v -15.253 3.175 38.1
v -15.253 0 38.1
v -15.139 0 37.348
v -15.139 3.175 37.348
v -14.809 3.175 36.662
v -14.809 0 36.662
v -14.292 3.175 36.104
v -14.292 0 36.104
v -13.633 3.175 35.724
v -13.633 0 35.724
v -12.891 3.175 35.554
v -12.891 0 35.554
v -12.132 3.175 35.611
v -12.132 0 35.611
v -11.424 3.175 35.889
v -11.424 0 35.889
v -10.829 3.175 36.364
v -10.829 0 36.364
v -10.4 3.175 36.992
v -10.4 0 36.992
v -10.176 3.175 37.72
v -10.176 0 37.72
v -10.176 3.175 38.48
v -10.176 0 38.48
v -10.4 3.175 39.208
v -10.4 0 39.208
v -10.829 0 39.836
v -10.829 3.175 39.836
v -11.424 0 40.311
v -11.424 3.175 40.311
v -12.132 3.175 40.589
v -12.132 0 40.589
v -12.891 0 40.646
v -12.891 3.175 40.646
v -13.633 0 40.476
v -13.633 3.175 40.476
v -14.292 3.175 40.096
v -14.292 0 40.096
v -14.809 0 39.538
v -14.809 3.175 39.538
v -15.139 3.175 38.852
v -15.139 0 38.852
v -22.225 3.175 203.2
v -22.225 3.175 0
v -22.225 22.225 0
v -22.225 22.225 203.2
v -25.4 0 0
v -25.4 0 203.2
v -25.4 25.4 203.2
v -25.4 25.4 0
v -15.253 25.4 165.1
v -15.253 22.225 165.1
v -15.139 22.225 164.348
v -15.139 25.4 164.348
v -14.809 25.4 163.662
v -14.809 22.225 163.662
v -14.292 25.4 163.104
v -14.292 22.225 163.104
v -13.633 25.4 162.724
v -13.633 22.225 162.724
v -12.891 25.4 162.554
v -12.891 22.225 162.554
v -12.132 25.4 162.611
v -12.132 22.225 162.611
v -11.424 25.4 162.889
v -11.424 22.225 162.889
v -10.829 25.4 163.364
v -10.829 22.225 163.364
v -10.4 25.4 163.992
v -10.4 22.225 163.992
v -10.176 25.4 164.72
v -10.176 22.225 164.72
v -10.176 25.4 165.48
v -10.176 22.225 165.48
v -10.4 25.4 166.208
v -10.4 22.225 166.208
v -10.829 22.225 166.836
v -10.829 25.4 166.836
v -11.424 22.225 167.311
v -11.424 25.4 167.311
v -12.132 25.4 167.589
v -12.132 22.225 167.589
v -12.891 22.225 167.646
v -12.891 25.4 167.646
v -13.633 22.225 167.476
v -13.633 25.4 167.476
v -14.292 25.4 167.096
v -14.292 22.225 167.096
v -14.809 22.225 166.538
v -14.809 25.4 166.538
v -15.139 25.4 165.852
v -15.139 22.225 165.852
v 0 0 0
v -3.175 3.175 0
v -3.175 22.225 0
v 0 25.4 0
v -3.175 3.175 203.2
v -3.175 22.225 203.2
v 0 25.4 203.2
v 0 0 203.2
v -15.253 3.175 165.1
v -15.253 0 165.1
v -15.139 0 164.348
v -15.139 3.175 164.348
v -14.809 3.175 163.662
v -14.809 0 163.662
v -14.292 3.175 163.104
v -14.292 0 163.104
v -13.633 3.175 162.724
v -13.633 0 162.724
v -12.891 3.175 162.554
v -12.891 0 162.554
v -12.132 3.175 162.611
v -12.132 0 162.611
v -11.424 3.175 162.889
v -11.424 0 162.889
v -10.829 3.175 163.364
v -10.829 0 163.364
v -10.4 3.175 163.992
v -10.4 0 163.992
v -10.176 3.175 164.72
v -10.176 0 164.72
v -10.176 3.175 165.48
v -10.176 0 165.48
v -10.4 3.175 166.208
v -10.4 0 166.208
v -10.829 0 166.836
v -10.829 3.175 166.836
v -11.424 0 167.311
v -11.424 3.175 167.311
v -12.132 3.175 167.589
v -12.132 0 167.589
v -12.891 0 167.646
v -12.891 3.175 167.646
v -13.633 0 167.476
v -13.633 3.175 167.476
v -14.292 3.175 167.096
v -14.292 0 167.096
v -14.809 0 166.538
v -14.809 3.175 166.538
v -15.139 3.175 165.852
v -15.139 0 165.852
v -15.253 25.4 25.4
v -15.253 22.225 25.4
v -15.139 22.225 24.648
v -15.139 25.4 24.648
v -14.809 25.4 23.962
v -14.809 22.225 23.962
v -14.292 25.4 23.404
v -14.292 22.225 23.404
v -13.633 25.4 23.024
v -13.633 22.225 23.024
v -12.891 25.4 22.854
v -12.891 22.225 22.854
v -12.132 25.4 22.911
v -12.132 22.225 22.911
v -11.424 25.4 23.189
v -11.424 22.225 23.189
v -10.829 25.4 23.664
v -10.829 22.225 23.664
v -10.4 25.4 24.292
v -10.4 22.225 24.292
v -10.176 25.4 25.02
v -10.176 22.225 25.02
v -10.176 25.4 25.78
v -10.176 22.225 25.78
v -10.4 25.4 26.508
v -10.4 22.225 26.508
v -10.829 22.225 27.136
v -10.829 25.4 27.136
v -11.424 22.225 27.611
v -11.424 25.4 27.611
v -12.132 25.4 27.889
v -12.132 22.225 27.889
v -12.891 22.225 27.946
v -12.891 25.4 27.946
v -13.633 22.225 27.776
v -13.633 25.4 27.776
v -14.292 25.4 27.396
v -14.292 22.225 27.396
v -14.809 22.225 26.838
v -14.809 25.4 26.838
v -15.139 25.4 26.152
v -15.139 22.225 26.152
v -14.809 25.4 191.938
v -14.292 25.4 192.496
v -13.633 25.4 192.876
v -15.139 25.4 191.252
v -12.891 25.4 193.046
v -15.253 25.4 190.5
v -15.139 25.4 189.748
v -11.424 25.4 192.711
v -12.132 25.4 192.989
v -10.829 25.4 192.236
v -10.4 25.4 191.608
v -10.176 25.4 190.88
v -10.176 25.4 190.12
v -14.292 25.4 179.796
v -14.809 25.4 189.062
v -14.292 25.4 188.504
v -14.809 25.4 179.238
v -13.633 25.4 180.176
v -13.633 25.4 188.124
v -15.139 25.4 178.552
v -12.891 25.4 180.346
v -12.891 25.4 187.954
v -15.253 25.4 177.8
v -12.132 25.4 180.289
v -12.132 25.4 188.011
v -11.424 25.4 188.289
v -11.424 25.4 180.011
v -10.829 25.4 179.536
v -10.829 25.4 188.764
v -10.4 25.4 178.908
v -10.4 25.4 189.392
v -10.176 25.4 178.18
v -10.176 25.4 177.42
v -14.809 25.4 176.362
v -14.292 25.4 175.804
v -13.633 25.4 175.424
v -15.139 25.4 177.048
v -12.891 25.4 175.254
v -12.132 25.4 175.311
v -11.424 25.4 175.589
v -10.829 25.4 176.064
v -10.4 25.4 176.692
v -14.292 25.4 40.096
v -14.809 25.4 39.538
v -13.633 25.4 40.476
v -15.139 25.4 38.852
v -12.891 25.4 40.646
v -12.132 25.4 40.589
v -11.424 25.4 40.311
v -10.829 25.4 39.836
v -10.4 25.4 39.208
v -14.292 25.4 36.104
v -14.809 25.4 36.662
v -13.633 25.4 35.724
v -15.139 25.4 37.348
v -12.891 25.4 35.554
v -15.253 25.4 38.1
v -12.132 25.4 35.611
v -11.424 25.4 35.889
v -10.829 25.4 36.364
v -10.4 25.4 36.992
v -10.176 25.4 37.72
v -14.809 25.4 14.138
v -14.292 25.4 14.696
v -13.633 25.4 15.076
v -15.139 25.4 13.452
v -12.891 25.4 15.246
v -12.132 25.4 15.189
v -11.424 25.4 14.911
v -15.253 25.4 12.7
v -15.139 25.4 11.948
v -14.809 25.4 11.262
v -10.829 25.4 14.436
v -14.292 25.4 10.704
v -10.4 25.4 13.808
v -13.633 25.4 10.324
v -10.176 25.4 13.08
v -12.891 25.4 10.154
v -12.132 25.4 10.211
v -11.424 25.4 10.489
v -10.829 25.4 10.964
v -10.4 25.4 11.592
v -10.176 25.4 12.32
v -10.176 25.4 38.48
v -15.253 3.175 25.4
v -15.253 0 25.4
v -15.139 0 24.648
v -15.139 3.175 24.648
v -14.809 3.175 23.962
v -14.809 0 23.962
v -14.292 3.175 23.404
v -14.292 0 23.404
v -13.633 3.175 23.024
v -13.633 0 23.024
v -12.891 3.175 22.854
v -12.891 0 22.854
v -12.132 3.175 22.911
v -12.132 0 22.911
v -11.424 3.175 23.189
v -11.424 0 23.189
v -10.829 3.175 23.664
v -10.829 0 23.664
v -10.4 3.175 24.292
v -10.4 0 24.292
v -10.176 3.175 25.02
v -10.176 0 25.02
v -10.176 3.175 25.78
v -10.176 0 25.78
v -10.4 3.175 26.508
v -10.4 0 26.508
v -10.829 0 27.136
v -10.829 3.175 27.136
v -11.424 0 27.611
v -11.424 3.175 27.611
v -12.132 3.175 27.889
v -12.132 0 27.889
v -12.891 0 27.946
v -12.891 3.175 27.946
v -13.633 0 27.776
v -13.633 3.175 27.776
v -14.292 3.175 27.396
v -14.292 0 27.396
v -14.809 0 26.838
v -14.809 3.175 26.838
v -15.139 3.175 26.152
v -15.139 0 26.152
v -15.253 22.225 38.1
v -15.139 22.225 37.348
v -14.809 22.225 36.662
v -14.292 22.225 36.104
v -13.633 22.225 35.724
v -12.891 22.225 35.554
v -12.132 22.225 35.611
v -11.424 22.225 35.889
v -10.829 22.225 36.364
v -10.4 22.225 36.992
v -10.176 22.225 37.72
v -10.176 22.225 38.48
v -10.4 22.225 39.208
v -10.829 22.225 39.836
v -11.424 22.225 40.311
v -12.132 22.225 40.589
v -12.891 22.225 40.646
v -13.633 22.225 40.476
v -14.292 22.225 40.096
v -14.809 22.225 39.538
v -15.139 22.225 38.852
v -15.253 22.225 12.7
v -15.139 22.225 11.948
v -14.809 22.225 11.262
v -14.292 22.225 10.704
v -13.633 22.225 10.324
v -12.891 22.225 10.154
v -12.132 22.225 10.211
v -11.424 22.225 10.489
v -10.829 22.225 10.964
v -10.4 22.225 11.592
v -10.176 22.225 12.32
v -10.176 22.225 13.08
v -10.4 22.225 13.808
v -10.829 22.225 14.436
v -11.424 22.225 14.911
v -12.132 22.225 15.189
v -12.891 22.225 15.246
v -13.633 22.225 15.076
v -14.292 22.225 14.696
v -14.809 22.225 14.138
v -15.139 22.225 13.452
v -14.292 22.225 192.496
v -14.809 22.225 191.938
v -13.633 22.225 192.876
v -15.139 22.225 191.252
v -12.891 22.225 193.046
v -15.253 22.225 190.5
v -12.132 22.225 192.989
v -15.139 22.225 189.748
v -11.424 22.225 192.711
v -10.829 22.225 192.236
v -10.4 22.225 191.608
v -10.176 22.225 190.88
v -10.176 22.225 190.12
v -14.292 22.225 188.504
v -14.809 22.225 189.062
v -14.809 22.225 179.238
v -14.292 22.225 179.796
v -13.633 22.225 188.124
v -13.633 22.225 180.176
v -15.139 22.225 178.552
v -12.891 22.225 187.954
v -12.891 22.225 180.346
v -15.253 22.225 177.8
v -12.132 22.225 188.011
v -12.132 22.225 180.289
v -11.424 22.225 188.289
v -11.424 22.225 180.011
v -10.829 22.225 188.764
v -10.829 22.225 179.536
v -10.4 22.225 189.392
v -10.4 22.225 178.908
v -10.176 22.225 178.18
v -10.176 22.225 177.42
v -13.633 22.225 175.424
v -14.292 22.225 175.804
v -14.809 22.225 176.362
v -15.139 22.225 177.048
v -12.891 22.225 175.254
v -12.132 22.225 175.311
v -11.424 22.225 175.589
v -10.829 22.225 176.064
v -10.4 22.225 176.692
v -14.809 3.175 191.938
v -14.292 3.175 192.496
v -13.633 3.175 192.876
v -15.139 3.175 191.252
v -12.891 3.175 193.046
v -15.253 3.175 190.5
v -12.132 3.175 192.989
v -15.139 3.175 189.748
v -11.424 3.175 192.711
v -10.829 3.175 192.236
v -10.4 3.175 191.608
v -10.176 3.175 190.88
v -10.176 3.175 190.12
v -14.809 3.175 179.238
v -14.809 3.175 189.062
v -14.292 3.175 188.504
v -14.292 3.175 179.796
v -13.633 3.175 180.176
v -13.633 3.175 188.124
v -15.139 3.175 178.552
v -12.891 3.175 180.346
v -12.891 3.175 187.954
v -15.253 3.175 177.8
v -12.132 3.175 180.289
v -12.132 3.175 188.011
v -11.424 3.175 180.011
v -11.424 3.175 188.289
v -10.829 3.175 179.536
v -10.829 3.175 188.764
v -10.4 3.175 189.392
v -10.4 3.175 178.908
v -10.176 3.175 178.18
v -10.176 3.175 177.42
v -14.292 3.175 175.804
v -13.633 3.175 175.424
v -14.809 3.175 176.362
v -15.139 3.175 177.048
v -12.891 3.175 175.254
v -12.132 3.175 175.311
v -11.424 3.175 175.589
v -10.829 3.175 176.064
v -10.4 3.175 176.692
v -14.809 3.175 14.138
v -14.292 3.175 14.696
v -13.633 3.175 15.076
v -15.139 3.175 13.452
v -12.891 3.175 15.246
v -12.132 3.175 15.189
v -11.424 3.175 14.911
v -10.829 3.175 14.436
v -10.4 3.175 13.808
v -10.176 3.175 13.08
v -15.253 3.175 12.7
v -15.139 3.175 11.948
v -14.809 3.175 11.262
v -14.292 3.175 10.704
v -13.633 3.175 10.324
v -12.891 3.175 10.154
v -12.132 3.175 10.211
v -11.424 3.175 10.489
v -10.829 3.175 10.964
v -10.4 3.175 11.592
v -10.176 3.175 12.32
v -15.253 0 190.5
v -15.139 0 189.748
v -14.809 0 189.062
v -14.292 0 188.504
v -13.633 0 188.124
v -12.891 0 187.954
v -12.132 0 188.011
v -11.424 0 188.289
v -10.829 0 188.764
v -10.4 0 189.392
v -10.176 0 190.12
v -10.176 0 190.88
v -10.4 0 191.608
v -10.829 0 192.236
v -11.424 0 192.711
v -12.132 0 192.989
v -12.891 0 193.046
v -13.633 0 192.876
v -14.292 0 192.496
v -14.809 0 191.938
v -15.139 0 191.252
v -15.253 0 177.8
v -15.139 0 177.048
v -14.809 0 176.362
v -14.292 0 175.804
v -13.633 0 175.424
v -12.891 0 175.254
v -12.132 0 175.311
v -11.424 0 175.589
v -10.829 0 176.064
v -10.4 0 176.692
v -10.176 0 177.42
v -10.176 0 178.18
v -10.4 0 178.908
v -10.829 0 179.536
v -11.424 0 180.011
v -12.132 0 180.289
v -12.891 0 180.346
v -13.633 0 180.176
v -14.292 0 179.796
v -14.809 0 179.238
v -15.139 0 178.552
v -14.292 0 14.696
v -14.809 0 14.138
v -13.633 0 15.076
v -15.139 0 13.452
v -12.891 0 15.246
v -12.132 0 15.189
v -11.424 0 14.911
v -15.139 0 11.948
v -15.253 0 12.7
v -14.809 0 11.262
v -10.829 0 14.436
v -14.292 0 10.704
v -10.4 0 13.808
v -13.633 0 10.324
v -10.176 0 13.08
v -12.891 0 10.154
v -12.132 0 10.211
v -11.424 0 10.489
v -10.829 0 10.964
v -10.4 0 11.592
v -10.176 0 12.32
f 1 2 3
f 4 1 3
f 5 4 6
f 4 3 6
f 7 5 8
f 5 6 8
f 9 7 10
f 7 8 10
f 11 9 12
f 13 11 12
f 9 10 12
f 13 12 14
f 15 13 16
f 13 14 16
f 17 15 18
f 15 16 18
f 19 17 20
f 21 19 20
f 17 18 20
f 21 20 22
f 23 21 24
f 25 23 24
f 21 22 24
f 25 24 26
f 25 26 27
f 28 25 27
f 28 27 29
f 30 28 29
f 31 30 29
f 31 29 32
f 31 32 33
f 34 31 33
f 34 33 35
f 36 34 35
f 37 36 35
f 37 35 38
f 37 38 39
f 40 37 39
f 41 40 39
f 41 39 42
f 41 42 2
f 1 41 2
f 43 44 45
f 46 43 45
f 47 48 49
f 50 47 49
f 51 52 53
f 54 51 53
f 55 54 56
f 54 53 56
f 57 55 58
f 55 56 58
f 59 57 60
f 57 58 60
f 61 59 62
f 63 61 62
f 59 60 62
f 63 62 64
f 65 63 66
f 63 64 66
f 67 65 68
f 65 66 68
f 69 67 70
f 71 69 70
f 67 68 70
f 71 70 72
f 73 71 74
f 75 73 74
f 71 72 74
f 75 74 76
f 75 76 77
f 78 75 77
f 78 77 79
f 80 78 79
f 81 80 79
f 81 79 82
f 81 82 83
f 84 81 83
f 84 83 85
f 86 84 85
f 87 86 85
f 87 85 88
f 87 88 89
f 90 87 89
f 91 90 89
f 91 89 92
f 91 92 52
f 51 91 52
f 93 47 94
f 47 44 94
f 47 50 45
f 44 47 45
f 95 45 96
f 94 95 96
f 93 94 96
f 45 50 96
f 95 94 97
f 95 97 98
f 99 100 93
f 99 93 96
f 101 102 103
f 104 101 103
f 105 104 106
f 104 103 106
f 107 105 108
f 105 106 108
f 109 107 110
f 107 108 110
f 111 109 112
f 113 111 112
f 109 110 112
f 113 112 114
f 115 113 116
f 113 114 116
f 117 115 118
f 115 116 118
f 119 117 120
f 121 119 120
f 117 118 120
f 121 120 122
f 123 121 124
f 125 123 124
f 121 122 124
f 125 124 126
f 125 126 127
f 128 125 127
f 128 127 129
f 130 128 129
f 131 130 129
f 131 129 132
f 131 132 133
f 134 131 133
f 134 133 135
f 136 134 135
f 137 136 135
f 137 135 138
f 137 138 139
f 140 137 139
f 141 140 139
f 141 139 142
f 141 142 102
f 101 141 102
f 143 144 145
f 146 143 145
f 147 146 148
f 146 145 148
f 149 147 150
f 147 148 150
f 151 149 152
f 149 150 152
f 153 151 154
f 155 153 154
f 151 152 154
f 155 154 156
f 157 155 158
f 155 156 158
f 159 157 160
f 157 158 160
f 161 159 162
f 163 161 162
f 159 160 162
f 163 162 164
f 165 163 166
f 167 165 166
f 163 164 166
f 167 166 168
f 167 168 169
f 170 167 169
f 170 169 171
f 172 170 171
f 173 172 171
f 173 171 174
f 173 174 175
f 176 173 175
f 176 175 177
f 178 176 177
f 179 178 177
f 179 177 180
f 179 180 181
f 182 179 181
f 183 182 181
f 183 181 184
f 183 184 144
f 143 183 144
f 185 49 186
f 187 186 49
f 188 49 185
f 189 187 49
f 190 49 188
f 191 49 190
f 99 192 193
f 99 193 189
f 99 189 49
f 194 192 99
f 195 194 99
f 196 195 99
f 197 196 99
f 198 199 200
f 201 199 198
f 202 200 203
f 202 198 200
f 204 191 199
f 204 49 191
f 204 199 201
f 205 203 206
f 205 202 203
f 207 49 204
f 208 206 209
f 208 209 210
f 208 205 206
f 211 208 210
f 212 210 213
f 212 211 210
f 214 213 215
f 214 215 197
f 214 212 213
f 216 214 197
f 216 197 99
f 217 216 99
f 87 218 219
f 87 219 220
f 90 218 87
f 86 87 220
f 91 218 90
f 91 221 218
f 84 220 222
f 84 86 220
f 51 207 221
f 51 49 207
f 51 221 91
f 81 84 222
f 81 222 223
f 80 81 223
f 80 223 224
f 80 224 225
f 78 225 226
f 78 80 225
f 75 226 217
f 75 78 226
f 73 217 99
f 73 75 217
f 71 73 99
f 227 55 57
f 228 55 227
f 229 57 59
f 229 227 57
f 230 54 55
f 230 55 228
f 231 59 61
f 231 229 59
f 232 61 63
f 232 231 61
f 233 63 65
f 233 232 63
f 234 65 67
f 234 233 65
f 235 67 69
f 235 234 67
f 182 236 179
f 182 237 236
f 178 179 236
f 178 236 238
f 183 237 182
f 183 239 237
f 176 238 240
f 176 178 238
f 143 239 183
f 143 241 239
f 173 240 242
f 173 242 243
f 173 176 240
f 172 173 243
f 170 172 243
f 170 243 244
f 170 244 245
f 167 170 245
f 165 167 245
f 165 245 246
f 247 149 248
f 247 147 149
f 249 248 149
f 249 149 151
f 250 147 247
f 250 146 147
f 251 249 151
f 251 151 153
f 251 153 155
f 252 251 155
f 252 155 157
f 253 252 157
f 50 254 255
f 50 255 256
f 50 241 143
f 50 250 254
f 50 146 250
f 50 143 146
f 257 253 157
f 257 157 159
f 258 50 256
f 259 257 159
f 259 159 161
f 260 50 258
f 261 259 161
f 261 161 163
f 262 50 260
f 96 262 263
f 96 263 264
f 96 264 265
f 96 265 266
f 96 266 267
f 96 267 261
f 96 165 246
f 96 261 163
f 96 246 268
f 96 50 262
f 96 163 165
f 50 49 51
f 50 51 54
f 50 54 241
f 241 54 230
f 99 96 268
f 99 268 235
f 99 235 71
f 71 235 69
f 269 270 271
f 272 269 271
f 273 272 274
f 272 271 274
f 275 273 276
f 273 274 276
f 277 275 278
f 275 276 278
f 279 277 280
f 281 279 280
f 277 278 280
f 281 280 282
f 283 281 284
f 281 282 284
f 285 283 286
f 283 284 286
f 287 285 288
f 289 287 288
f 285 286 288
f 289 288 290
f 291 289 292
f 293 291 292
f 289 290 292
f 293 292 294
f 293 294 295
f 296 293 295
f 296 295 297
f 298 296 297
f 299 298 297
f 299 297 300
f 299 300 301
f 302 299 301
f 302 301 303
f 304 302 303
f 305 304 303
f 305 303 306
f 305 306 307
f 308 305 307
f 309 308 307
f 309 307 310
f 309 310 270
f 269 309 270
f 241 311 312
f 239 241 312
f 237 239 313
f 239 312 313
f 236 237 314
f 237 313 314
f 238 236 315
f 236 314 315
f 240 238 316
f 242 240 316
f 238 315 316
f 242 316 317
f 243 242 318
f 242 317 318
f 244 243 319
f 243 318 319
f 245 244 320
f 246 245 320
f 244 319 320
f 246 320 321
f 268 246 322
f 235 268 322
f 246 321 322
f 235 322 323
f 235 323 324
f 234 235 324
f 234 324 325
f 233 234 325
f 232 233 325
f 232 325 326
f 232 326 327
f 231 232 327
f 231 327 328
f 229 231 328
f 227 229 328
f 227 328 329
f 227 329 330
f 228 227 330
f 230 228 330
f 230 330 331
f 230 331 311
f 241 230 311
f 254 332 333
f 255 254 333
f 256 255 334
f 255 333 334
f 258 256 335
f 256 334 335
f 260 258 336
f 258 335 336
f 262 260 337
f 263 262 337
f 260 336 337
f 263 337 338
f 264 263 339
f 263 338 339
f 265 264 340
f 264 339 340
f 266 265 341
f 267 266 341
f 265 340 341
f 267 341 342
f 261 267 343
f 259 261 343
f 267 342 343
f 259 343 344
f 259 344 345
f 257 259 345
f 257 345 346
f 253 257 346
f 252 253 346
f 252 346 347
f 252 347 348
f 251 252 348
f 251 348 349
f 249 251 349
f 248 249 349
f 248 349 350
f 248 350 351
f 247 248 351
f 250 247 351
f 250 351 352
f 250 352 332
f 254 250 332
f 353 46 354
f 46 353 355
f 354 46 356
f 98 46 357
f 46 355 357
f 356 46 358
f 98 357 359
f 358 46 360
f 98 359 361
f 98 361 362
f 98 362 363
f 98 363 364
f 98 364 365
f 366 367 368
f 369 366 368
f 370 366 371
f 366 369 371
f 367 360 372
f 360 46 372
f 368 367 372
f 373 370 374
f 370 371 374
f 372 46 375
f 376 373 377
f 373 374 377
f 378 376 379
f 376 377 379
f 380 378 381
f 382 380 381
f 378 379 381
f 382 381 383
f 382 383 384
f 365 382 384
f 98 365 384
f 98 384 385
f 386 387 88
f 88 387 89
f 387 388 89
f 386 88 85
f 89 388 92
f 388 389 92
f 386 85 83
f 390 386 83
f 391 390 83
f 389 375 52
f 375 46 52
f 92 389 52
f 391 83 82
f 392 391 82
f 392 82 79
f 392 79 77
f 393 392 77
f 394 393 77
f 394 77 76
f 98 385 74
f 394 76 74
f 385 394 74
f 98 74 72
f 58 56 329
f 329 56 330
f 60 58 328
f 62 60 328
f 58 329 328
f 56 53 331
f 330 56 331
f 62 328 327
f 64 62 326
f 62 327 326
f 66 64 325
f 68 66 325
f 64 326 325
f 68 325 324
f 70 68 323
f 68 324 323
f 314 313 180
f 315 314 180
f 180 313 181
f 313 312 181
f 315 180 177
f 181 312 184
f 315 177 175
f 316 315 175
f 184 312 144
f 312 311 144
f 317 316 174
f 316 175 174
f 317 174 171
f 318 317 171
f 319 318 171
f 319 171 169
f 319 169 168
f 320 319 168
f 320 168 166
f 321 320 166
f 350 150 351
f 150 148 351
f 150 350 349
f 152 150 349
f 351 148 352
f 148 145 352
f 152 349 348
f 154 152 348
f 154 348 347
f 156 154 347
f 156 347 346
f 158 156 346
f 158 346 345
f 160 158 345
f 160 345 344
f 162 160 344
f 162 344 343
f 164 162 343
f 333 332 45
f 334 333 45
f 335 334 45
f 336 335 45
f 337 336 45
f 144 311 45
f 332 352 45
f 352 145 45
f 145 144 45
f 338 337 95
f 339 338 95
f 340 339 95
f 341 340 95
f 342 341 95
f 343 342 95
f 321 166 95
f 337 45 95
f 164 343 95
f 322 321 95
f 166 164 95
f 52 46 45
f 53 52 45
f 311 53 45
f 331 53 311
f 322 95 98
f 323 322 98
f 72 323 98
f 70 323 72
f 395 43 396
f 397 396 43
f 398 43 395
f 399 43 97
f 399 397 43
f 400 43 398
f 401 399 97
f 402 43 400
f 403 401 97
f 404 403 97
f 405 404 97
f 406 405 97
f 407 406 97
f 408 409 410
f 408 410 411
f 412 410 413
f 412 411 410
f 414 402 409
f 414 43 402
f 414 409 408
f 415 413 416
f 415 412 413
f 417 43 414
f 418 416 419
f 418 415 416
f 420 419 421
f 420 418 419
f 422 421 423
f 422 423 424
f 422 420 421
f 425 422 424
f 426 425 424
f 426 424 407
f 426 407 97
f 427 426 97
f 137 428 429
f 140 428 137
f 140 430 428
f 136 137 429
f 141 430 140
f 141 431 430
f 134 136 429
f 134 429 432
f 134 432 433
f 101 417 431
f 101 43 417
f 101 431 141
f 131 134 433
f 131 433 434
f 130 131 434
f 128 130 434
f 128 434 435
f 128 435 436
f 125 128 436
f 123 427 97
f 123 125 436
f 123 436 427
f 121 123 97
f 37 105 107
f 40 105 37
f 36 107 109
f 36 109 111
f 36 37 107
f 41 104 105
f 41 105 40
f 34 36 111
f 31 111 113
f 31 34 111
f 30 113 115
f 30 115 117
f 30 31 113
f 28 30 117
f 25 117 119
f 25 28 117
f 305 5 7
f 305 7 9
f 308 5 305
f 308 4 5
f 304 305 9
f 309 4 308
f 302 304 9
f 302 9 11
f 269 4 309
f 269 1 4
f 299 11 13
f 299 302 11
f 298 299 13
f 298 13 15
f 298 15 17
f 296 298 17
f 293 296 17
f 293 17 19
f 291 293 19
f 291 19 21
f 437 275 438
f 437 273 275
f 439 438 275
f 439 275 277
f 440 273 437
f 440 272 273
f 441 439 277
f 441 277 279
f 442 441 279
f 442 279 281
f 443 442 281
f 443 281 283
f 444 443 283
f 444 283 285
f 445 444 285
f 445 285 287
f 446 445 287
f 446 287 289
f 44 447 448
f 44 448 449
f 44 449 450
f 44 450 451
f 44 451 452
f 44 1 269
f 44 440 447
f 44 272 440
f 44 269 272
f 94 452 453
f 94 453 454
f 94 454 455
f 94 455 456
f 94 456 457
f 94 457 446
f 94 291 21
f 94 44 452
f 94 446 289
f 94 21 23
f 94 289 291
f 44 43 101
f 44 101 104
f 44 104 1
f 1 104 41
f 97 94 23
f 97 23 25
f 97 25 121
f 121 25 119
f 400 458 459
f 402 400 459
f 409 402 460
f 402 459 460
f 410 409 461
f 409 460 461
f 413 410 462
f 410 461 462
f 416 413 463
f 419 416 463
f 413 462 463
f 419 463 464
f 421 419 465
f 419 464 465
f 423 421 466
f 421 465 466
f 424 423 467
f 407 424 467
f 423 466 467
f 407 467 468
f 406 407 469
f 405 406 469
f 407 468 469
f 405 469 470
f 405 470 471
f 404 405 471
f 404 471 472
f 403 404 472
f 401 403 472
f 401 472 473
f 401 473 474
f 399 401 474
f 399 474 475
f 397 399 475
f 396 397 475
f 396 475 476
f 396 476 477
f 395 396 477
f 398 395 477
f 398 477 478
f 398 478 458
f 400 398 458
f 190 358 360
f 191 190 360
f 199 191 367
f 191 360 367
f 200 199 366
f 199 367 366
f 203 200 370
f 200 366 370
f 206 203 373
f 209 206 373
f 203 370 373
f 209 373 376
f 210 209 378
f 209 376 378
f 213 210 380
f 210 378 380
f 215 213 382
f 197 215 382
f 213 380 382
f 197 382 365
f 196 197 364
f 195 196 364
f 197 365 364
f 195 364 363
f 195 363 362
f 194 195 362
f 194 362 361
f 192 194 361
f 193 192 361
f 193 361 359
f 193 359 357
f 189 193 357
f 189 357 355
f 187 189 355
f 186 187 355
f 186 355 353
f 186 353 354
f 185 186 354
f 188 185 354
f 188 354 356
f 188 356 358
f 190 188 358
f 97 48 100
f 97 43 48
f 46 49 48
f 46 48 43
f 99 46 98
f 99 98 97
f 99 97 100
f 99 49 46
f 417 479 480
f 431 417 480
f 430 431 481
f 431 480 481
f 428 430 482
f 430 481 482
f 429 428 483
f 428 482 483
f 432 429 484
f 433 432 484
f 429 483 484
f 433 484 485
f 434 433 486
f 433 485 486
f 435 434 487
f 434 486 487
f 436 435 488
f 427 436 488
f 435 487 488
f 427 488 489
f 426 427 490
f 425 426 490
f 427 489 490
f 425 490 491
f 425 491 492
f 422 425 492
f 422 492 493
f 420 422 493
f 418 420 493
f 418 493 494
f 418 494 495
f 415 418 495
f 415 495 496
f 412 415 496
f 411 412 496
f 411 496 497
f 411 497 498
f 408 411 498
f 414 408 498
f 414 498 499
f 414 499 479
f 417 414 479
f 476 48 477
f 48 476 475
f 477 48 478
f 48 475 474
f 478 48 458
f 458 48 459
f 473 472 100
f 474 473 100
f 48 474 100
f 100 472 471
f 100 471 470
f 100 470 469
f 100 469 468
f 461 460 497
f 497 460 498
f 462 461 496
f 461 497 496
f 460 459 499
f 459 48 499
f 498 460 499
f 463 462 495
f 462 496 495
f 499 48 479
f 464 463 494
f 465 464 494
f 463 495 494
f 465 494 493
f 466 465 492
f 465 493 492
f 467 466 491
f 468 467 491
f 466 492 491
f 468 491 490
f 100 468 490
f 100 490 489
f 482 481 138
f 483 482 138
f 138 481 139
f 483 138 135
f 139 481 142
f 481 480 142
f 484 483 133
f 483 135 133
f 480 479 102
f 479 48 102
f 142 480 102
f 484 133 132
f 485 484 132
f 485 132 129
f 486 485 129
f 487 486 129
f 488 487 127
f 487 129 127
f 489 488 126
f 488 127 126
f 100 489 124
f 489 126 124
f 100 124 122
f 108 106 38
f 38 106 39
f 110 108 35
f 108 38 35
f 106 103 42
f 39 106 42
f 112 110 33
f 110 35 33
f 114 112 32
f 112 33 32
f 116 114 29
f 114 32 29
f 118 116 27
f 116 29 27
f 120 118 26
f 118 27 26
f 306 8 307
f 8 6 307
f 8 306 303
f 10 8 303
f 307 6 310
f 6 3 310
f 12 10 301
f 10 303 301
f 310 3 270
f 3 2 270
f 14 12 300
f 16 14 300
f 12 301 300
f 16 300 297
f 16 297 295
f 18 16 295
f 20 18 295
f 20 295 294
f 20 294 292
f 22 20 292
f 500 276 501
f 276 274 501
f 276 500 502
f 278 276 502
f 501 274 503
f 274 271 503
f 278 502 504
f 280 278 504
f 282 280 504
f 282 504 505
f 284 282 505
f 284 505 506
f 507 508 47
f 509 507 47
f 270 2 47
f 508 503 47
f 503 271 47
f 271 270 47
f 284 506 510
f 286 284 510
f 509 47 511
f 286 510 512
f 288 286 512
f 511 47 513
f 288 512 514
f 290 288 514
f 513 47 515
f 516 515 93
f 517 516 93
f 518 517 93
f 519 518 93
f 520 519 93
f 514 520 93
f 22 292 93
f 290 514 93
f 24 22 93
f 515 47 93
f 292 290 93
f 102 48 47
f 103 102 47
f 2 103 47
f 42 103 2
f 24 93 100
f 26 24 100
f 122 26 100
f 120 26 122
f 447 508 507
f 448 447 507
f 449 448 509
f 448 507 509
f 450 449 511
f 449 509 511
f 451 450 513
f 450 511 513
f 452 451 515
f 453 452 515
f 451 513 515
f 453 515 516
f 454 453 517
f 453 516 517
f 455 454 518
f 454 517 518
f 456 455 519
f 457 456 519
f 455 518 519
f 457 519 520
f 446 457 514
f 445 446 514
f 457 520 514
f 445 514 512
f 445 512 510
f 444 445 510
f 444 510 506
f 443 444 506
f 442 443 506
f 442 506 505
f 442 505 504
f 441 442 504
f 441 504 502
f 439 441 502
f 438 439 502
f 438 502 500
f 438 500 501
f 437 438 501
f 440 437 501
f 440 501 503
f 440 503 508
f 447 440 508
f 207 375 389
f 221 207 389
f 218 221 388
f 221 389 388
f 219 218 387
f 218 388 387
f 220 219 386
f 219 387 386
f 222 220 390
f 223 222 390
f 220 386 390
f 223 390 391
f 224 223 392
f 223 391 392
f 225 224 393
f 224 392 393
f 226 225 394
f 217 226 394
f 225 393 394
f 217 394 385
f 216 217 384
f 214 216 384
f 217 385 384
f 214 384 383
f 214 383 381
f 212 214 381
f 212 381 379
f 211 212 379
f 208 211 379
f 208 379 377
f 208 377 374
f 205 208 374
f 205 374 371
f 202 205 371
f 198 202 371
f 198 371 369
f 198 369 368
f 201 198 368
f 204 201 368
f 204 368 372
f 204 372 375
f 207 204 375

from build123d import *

# Parameters (mm, degrees)
SKETCH1_W              = 25.4
SKETCH1_H              = 25.4
SKETCH1_W_2            = 19.05
SKETCH1_H_2            = 19.05
BOSS_EXTRUDE1_DEPTH    = 203.2
F_10_CLEARANCE_HOLE1_D = 5.1054


with BuildPart() as part:
    # Sketch1 → Boss-Extrude1 (new body)
    with BuildSketch(Plane.XY):
        with Locations((-12.7, 12.7)):
            Rectangle(SKETCH1_W, SKETCH1_H)
        with Locations((-12.7, 12.7)):
            Rectangle(SKETCH1_W_2, SKETCH1_H_2, mode=Mode.SUBTRACT)
    extrude(amount=BOSS_EXTRUDE1_DEPTH)

    # #10 Clearance Hole1 (through all)
    with Locations(Plane(origin=(0, 25.4, 0), x_dir=(1, 0, 0), z_dir=(0, 1, 0))):
        with Locations((-12.7, -165.1), (-12.7, -177.8), (-12.7, -190.5), (-12.7, -12.7), (-12.7, -25.4), (-12.7, -38.1)):
            Hole(F_10_CLEARANCE_HOLE1_D / 2)


solid = part.part
